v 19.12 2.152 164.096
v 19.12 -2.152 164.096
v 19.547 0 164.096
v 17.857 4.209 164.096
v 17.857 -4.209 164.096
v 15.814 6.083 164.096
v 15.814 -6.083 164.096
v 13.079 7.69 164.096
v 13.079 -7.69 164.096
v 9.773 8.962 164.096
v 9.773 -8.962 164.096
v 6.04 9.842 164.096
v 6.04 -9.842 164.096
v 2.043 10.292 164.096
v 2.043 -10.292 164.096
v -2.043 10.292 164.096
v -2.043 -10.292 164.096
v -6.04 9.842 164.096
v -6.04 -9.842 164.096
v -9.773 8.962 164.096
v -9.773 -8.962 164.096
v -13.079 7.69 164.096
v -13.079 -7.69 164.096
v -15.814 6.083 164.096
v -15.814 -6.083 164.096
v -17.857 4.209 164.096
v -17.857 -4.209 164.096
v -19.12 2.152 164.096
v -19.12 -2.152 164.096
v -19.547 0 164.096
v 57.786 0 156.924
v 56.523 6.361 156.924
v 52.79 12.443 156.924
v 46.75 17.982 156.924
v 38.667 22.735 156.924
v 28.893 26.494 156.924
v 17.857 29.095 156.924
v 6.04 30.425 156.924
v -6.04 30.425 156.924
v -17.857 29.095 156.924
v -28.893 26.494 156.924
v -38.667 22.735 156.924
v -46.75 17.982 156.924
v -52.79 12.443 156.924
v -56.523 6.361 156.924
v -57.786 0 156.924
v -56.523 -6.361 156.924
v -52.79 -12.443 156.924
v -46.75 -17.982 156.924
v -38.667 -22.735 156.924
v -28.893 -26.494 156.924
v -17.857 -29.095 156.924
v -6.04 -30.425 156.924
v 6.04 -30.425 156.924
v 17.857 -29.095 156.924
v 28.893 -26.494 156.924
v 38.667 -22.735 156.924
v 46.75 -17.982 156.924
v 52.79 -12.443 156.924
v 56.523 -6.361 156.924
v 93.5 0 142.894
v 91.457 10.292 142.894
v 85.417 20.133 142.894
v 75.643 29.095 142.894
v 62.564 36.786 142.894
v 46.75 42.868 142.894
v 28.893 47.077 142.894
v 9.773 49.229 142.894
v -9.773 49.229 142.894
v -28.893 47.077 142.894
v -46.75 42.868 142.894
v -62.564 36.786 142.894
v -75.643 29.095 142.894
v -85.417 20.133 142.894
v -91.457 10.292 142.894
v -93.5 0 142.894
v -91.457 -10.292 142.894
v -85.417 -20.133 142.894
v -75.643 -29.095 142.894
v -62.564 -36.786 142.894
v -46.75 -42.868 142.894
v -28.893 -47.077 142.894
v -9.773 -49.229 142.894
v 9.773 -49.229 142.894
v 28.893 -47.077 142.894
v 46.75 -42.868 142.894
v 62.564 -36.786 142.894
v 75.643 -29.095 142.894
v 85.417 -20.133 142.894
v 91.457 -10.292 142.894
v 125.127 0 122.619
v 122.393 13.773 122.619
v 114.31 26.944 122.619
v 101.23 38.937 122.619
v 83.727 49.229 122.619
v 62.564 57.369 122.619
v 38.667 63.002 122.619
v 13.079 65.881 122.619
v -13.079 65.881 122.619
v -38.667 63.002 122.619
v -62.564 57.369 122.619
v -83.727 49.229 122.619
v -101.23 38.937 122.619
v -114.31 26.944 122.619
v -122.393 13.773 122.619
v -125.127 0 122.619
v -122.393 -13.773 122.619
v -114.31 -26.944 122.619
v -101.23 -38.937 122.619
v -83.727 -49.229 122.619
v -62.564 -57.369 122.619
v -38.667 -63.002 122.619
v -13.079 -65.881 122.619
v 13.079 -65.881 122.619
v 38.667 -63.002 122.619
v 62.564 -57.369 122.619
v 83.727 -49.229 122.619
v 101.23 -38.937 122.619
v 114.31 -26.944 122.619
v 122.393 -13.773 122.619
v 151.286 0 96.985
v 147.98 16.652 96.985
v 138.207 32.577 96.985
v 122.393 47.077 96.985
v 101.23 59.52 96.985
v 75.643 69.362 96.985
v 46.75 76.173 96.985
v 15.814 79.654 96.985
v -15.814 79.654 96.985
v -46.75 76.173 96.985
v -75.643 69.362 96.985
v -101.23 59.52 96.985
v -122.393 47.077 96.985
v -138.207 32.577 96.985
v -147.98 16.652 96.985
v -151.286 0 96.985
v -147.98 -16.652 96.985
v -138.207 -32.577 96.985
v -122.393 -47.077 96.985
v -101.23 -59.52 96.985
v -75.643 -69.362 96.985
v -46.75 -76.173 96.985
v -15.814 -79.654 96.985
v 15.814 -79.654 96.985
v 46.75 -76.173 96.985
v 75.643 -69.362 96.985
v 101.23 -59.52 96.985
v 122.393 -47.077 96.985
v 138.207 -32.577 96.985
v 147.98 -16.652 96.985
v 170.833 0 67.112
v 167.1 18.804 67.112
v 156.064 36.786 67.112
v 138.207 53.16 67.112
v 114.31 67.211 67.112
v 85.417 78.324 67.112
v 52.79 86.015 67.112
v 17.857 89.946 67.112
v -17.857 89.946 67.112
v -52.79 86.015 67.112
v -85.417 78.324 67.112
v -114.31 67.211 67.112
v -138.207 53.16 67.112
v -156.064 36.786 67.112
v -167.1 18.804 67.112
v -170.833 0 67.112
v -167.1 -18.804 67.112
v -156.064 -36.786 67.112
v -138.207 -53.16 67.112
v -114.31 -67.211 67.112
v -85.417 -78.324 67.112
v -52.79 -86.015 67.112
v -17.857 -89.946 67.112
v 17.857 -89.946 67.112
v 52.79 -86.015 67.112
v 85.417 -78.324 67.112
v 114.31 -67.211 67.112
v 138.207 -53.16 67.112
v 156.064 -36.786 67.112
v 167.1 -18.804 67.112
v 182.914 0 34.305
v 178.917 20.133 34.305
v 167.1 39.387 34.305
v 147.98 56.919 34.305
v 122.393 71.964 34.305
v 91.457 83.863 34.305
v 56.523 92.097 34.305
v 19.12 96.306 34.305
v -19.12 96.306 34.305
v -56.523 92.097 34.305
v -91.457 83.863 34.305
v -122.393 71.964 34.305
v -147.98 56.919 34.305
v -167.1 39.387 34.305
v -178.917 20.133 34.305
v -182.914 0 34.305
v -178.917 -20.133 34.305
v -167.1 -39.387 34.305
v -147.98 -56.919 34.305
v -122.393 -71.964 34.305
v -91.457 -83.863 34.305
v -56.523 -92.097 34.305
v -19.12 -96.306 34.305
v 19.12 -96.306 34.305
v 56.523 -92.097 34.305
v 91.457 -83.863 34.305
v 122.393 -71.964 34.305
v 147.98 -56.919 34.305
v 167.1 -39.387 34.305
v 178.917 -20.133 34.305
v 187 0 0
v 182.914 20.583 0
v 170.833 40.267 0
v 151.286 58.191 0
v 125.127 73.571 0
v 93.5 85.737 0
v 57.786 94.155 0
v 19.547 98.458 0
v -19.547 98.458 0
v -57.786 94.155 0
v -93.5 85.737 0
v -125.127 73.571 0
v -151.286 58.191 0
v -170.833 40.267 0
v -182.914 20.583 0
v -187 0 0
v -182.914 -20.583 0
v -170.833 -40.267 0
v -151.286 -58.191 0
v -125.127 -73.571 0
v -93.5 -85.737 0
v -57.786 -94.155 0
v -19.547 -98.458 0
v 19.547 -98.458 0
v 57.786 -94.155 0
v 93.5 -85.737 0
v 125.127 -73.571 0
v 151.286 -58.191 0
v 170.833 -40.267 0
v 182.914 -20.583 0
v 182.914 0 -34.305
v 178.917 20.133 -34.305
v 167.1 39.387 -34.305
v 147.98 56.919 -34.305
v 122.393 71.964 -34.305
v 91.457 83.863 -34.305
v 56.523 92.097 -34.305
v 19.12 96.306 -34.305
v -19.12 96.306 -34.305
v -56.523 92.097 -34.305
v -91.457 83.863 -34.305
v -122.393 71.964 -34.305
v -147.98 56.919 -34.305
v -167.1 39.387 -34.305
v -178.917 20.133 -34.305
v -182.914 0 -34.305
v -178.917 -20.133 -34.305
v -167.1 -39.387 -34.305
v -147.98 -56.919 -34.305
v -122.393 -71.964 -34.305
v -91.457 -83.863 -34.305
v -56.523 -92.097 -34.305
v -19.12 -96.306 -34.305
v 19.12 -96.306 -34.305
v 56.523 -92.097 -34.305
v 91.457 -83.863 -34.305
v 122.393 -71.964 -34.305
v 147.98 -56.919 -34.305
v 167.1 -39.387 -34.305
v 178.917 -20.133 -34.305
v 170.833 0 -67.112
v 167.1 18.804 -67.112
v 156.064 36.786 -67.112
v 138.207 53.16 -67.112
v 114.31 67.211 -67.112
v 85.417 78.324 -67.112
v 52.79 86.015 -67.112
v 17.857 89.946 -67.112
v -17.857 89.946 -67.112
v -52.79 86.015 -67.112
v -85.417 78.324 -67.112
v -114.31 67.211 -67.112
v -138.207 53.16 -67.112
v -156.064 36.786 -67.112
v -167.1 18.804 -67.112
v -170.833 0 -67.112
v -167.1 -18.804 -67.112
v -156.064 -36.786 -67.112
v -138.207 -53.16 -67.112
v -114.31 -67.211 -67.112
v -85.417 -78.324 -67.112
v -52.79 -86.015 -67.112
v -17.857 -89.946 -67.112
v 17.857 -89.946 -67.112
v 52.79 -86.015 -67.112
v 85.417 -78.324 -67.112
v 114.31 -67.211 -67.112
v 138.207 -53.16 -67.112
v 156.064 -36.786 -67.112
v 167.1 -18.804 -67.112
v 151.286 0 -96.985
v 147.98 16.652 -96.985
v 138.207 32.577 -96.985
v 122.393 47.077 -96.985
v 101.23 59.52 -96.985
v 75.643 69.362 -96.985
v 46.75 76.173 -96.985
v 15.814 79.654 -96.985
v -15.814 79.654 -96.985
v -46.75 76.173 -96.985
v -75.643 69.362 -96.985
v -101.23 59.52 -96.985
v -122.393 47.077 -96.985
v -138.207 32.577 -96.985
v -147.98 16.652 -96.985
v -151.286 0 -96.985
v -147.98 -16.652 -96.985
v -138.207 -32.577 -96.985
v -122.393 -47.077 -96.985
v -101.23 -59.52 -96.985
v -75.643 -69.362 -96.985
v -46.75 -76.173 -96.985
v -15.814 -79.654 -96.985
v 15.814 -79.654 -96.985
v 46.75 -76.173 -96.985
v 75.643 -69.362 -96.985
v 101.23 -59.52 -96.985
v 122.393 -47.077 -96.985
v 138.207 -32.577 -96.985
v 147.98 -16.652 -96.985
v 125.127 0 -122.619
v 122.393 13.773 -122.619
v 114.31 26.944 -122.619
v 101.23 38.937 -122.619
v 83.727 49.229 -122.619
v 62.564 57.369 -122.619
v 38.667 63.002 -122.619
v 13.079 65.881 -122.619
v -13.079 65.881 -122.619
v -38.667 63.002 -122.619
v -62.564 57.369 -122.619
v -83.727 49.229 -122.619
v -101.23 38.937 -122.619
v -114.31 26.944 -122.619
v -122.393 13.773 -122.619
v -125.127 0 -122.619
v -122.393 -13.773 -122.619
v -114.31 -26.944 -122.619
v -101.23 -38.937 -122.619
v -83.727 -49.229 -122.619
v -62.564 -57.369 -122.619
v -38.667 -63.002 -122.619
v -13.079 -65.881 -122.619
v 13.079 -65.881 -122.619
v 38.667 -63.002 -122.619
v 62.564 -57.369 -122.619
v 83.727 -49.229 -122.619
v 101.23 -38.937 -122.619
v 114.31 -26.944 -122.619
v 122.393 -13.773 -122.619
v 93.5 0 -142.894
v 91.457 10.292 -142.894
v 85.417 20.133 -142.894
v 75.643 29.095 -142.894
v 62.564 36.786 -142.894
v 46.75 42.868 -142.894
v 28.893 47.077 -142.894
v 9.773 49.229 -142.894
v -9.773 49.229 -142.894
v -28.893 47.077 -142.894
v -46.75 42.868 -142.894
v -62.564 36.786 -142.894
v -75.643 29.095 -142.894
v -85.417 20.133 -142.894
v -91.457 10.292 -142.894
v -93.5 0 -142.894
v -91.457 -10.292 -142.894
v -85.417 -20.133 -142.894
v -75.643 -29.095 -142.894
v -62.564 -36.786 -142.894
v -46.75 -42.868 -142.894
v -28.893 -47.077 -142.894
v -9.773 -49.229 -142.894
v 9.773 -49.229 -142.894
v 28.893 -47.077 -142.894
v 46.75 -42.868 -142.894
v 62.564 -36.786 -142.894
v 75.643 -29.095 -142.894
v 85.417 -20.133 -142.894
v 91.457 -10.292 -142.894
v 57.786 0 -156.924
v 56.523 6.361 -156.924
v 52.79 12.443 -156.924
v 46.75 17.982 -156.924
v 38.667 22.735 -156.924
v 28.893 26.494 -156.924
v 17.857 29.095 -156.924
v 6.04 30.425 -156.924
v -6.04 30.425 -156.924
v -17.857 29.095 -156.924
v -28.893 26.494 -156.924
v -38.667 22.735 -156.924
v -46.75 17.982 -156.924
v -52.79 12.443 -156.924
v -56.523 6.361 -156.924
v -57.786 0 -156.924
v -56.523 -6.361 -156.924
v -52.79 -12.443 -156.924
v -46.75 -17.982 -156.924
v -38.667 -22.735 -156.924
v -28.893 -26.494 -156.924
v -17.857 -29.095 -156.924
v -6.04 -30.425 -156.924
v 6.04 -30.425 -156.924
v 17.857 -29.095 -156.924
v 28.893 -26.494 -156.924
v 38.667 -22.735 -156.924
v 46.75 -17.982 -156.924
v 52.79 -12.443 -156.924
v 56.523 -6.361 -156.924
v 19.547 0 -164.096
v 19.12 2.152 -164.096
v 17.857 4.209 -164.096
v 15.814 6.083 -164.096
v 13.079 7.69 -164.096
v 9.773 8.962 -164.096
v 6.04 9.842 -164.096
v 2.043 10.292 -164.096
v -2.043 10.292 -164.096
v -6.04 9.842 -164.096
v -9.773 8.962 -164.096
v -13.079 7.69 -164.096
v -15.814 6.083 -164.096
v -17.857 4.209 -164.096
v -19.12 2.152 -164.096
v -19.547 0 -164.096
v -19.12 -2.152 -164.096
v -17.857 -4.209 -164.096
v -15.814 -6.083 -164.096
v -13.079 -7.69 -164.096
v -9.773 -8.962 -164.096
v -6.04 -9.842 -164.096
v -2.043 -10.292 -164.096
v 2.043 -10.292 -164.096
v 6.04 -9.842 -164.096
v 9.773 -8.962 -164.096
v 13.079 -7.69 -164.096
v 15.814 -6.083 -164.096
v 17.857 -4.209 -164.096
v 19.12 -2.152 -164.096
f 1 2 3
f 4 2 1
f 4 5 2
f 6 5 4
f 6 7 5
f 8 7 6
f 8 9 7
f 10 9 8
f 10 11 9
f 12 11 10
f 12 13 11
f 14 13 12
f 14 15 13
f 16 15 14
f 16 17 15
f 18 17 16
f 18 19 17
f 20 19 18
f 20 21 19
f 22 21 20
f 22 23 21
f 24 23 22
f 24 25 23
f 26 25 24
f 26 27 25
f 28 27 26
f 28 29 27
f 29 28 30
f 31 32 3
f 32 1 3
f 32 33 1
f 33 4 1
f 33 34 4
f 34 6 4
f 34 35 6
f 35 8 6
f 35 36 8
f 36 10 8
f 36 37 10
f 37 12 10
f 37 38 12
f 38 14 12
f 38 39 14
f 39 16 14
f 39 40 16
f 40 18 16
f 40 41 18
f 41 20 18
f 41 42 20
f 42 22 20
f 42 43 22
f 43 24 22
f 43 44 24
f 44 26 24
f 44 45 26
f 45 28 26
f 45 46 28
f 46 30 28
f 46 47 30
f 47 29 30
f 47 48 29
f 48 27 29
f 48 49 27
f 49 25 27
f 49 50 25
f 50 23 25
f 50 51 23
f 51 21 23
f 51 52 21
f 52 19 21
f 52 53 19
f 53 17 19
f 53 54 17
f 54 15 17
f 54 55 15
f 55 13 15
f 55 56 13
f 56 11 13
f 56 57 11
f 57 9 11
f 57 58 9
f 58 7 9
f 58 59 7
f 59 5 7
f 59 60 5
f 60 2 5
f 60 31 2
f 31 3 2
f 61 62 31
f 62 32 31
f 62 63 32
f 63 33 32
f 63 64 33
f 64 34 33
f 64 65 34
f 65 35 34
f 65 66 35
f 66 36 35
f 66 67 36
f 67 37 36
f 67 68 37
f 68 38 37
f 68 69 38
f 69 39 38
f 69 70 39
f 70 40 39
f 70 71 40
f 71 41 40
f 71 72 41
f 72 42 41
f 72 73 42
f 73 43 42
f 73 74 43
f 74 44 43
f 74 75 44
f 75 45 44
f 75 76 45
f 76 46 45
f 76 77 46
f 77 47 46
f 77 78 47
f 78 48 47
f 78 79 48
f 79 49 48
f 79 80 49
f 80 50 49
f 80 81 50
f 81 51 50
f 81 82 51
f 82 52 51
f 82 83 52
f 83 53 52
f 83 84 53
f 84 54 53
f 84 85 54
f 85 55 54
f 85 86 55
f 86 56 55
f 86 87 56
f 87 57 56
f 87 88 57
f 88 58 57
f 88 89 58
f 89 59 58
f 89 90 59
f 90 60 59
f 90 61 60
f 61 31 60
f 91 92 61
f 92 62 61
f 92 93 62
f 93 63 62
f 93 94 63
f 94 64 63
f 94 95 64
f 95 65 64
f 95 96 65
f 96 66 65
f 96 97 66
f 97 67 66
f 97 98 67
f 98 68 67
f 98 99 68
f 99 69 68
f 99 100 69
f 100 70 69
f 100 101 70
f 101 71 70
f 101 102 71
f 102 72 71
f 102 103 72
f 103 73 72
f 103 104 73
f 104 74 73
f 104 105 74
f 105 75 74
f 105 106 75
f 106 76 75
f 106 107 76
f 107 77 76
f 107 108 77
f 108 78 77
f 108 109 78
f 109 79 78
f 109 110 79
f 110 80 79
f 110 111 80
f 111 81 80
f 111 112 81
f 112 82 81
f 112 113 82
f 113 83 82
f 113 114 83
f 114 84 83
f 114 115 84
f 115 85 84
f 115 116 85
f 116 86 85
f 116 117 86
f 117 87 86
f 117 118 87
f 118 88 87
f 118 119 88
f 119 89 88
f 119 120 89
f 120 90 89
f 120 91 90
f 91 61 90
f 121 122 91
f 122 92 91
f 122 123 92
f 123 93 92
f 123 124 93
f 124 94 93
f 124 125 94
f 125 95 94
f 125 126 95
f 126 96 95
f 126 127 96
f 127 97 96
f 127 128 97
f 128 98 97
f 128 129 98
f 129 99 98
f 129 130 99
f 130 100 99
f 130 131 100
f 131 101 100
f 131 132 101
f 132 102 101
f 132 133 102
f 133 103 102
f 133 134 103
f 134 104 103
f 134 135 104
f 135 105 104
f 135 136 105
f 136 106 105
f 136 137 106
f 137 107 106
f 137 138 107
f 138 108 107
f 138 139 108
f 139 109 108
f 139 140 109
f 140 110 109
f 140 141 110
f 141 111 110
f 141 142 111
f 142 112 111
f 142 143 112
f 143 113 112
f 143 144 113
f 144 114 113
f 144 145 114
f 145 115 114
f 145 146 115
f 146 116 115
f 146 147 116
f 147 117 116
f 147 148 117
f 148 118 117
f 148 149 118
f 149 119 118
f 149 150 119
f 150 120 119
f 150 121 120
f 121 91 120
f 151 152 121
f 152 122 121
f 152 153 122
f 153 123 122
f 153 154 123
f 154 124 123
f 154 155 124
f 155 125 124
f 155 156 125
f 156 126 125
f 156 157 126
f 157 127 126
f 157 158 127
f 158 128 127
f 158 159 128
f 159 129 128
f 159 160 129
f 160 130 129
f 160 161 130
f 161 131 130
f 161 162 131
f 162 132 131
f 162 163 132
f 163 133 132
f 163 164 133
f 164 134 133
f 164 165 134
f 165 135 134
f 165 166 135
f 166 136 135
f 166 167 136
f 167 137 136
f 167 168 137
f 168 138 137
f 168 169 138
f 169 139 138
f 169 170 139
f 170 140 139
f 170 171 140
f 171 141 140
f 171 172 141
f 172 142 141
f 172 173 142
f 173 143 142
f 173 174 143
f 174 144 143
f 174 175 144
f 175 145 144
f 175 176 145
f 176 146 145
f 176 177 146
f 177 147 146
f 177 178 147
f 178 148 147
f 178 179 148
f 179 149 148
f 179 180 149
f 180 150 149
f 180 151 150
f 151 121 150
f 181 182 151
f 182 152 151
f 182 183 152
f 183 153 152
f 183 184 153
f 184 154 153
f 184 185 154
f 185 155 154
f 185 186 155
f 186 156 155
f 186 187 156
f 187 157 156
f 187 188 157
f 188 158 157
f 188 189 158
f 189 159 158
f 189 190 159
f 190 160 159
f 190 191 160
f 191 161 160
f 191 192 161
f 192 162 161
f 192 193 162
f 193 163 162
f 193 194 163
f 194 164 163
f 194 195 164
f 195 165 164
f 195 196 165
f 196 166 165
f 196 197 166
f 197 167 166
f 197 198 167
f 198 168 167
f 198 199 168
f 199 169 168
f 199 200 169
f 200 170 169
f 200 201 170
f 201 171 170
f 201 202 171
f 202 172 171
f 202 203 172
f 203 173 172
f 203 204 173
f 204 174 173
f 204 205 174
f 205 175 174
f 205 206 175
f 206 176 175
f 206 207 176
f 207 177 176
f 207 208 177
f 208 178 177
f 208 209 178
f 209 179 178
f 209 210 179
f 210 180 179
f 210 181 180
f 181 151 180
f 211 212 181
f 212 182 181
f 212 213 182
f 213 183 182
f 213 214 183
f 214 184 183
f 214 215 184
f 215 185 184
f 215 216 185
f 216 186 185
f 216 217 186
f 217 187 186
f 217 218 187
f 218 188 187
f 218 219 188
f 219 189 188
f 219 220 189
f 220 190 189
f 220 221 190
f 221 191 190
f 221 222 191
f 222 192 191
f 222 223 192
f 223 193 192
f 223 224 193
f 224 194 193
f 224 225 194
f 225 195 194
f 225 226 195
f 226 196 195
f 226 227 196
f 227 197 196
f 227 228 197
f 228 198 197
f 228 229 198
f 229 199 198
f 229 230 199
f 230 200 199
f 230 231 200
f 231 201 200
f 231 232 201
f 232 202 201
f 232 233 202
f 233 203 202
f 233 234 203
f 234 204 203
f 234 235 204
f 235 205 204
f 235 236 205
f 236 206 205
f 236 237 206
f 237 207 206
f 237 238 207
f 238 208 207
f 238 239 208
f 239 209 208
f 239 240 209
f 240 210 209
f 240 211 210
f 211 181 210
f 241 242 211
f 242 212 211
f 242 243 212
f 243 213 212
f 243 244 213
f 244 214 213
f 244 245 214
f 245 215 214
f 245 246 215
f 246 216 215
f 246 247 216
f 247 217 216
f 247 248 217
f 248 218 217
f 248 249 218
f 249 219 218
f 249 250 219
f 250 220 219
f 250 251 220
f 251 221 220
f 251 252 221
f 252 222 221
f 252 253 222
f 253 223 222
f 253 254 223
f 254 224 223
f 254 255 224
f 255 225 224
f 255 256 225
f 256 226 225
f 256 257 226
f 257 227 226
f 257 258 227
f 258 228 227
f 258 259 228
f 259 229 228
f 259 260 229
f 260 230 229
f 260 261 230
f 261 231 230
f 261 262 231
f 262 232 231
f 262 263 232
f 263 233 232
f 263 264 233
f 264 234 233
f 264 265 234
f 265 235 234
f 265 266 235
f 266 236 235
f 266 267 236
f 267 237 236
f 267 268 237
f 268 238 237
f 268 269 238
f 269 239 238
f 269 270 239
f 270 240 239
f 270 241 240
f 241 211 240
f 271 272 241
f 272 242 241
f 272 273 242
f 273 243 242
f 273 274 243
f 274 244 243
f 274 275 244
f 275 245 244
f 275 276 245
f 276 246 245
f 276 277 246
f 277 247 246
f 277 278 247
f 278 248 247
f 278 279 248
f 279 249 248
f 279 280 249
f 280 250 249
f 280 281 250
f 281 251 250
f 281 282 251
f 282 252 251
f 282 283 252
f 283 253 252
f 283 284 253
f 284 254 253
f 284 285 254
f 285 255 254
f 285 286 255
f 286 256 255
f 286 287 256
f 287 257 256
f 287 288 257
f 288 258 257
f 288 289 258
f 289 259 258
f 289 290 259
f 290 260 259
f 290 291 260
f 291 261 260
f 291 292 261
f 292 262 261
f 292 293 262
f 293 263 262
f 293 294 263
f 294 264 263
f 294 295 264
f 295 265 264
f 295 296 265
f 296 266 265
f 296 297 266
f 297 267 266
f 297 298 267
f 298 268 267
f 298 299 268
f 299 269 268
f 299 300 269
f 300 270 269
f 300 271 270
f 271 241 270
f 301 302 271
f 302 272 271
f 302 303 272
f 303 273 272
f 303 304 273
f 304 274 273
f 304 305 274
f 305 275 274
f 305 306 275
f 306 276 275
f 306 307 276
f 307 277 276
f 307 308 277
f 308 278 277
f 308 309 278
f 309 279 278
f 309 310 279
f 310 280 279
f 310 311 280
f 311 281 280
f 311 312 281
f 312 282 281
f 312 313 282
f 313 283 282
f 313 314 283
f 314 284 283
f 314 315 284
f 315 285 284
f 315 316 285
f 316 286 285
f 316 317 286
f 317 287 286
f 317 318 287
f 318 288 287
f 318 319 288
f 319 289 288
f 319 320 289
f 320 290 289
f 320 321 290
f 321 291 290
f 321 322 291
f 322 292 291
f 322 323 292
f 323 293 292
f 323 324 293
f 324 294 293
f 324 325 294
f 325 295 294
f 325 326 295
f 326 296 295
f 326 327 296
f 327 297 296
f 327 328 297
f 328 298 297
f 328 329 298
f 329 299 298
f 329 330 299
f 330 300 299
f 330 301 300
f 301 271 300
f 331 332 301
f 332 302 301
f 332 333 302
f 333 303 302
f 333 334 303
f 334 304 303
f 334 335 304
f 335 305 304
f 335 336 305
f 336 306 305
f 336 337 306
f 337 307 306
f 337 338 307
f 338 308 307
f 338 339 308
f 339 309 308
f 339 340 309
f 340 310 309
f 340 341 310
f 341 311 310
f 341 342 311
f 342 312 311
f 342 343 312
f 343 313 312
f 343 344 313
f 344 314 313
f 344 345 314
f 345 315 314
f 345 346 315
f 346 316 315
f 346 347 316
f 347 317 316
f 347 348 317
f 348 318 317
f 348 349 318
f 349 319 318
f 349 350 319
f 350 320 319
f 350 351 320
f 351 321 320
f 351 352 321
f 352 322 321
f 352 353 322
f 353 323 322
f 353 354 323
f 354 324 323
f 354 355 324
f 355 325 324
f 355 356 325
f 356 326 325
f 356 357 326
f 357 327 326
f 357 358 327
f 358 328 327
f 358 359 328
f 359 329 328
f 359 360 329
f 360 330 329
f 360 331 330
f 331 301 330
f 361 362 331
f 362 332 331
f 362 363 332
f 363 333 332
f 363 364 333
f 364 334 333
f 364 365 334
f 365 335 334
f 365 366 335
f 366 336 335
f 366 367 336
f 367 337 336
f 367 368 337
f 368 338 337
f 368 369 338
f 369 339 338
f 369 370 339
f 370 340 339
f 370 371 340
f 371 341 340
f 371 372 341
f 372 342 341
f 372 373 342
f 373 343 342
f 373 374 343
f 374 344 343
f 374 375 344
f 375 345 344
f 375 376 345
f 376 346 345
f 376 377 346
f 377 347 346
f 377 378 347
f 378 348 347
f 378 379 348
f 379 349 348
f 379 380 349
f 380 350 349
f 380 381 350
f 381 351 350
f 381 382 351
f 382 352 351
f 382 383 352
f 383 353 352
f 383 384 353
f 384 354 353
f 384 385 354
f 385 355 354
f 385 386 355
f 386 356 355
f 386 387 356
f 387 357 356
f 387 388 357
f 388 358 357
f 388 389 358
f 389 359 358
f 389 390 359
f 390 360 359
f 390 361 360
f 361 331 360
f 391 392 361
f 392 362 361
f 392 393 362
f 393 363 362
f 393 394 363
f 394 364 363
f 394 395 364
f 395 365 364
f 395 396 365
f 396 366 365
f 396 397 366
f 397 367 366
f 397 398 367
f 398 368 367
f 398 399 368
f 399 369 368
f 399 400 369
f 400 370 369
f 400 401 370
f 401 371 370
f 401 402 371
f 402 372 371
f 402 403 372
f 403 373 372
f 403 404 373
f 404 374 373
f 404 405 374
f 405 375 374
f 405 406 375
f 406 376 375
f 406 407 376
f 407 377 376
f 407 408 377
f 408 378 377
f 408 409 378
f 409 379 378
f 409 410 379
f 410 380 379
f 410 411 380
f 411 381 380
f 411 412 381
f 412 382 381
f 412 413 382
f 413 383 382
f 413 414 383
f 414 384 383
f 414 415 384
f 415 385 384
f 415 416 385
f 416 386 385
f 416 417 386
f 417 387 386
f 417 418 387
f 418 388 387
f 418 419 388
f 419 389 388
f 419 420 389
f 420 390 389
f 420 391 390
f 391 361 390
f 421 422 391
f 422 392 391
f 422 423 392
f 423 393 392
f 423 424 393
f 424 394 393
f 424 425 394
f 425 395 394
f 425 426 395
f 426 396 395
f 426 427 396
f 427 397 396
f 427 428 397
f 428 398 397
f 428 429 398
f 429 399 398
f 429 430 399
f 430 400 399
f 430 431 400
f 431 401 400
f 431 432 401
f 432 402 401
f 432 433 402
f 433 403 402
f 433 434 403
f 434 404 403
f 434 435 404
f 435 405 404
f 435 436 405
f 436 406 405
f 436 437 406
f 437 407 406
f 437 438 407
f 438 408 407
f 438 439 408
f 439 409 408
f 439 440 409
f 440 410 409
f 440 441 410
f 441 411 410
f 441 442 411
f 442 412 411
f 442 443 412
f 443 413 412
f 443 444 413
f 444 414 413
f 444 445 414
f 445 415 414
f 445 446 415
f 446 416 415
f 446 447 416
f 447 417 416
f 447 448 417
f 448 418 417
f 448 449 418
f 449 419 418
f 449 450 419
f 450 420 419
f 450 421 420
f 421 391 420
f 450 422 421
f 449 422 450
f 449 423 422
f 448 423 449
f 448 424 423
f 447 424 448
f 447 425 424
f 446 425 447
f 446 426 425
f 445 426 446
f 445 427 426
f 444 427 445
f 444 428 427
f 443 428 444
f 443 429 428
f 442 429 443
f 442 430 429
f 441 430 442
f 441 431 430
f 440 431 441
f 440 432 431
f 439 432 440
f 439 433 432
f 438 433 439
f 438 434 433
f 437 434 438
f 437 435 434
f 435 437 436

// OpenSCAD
// Generated by SolidPython 1.0.1 on 2020-07-29 00:46:53


scale(v = [17, 9, 15]) {
	sphere(r = 11);
}
/***********************************************
*********      SolidPython code:      **********
************************************************
 
# import packages: SolidPython
from solid import *
from solid.utils import *
from itertools import chain, combinations, permutations


class Resize:

    def __init__(self, scad_file):
        self.scad_file = scad_file
        #self.scad_file = import_scad(scad_file)
        # cone/cylinder param:
        self.r1 = 0
        self.r2 = 0
        self.h = 0
        # rectangular prism param:
        self.w = 0
        self.l = 0
        # ellipse param:
        self.r = 0

    # import OpenScad code (file name corresponds to shape)


    # classify shape + parameters
    def assign(self, param1, param2, param3):
        if self.scad_file == 'cone.scad':
            self.r1 = param1
            self.r2 = param2
            self.h = param3
        elif self.scad_file == 'cylinder.scad':
            self.r1 = param1
            self.r2 = param2
            self.h = param3
        elif self.scad_file == 'rectangularPrism.scad':
            self.h = param1
            self.l = param2
            self.w = param3
        else:
            self.r = param1
            self.h = param2

    # resize parameters
    def iterate(self):
        x = range(3, 20, 2)
        i = 1
        if self.scad_file == 'cone.scad':
            tempList = list(permutations(x, 2))
            for temp in tempList:
                param1 = temp[0]
                param2 = temp[1]
                filepath = 'produced_scad_files/' + 'cone' + str(param1) + '_' + str(param2) + '_' + '.scad'
                scad_render_to_file(cylinder(h=param1, r1=param2, r2=0), filepath)

        elif self.scad_file == 'cylinder.scad':
            tempList = list(permutations(x, 3))
            for temp in tempList:
                param1 = temp[0]
                param2 = temp[1]
                filepath = 'produced_scad_files/' + 'cylinder' + str(param1) + '_' + str(param2) + '_' + '.scad'
                scad_render_to_file(cylinder(h=param1, r1=param2, r2=param2), filepath)

        elif self.scad_file == 'rectangularPrism.scad':
            tempList = list(permutations(x, 3))
            for temp in tempList:
                param1 = temp[0]
                param2 = temp[1]
                param3 = temp[2]
                filepath = 'produced_scad_files/' + 'rectangularPrism' + str(param1) + '_' + str(param2) + '_' + str(
                    param3) + '.scad'
                scad_render_to_file(cube(size=(param1, param2, param3)), filepath)

        elif self.scad_file == 'ellipse.scad':
            tempList = list(permutations(x, 4))
            for temp in tempList:
                param1 = temp[0]
                param2 = temp[1]
                param3 = temp[2]
                param4 = temp[3]
                filepath = 'produced_scad_files/' + 'ellipse' + str(param1) + '_' + str(param2) + '_' + str(param3) + '_' + str(param4) + '.scad'
                scad_render_to_file(scale([param1, param2, param3])(sphere(r=param4)), filepath)

    def render_to_scadfile(self):
        scad_render_to_file(scad, 'example.scad') 
 
************************************************/
